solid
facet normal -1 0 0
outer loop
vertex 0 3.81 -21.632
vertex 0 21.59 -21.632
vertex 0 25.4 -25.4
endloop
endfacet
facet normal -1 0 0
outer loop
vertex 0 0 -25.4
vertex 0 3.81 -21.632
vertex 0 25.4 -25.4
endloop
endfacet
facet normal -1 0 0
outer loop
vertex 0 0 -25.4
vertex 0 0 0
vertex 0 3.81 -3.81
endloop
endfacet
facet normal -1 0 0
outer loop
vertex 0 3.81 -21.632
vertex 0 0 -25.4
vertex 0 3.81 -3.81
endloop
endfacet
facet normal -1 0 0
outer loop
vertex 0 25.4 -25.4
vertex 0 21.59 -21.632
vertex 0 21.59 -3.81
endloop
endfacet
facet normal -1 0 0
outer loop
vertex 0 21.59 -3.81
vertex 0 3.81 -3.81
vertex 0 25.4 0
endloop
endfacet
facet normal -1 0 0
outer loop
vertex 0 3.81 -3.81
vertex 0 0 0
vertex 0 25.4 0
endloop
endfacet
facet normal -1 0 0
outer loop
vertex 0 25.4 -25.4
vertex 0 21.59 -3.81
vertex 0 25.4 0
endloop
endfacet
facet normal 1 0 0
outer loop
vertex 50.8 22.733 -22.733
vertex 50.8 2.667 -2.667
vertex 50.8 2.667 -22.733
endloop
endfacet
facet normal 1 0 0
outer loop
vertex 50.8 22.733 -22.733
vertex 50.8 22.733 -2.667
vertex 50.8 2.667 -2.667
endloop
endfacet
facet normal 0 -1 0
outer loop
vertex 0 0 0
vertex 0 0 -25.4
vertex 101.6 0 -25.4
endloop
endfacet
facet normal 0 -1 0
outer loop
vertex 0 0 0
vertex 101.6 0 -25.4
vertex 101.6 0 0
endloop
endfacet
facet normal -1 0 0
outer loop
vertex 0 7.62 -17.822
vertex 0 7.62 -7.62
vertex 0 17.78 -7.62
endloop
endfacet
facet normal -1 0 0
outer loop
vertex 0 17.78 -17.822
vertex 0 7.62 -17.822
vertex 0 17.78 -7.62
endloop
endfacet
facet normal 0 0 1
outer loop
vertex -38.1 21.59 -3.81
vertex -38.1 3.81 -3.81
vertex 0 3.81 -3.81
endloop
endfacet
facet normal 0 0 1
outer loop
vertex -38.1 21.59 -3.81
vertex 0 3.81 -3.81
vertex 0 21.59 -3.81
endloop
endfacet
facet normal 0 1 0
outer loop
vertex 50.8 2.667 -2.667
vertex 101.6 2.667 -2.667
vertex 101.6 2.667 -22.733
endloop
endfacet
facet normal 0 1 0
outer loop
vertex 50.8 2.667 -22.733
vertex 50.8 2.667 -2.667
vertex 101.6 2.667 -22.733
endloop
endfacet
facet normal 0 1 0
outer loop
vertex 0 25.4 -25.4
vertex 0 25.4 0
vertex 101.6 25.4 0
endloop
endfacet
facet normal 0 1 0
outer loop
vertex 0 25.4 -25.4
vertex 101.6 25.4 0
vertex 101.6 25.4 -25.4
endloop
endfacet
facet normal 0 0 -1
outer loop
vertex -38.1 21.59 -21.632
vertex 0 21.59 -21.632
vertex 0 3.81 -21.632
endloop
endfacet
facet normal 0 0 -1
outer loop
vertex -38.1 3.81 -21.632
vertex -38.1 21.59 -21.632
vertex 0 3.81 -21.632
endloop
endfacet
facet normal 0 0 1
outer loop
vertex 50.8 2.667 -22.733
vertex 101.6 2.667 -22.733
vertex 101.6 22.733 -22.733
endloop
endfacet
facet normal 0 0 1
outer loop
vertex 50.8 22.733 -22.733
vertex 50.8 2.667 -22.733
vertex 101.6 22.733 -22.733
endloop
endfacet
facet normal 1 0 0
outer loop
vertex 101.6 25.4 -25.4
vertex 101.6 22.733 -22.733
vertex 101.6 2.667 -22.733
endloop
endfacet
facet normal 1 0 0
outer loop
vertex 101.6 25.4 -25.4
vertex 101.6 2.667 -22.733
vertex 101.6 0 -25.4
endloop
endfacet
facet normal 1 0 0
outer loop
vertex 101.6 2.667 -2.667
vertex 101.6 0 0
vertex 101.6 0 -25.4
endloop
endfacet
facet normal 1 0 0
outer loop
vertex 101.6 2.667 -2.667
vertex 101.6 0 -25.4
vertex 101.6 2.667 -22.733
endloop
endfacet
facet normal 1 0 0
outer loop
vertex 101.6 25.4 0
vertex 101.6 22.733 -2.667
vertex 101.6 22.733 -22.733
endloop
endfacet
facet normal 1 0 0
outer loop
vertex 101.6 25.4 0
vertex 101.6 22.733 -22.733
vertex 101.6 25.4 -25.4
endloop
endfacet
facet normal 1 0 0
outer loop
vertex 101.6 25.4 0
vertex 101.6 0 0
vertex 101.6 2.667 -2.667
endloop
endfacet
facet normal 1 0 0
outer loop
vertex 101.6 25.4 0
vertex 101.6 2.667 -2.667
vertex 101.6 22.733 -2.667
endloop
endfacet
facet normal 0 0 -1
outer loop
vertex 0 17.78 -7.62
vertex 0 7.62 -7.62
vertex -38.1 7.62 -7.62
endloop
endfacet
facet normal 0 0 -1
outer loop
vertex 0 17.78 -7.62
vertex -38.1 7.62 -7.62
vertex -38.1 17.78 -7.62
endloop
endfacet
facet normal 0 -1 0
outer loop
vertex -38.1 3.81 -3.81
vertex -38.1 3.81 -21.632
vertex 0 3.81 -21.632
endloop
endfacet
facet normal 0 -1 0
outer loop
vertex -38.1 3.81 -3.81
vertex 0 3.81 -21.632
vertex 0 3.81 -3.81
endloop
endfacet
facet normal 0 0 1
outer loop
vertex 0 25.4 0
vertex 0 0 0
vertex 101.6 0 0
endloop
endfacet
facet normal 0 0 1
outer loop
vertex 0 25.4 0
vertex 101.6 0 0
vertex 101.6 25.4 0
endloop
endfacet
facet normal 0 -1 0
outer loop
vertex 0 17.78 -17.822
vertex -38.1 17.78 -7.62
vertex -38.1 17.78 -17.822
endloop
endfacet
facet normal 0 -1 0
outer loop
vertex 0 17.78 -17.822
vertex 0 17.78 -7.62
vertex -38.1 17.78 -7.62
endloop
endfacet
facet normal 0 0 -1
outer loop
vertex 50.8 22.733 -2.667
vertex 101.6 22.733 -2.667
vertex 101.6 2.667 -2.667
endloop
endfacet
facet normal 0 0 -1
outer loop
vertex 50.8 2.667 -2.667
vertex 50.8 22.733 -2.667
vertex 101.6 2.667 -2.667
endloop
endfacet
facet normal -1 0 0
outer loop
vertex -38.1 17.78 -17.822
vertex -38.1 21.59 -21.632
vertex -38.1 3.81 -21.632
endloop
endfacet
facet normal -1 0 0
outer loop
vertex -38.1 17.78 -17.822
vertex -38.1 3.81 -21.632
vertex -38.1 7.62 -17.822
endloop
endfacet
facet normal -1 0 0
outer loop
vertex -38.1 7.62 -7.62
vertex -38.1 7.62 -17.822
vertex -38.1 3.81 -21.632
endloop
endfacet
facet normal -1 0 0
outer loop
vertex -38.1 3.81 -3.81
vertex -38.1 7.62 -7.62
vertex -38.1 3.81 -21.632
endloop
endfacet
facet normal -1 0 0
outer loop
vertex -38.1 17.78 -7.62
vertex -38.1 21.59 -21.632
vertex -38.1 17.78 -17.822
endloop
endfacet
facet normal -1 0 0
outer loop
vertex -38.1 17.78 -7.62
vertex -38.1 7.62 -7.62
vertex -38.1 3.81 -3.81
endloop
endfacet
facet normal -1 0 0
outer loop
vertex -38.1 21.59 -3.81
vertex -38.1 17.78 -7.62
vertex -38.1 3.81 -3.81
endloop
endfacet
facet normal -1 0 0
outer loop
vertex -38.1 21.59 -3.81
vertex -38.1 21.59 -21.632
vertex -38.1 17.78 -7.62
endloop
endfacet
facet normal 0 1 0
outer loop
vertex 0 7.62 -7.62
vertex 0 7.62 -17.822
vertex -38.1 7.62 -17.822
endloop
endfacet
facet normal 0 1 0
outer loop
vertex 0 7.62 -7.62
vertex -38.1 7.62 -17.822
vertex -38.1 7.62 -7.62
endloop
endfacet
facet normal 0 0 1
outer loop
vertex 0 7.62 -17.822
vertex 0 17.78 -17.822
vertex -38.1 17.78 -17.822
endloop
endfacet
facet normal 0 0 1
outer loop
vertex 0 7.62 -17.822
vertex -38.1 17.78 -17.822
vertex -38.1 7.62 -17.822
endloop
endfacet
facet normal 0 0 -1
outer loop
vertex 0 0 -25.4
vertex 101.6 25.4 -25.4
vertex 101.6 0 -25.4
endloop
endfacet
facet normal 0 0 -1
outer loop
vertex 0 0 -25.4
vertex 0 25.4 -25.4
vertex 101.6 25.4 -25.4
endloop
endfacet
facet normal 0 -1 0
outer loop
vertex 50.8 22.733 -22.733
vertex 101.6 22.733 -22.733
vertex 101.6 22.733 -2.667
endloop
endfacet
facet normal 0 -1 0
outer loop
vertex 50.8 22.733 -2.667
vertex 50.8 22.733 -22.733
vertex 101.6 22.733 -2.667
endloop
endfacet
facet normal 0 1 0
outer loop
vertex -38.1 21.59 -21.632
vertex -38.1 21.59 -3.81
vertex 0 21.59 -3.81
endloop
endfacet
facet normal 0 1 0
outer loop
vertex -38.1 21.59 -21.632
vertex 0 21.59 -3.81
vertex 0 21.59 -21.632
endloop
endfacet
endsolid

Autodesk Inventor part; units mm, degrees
ref_plane "YZ Plane" through (0, 0, 0) normal (1, 0, 0) x (0, 1, 0)
ref_plane "XZ Plane" through (0, 0, 0) normal (0, 1, 0) x (-1, 0, 0)
ref_plane "XY Plane" through (0, 0, 0) normal (0, 0, 1) x (1, 0, 0)
sketch "Sketch1" plane through (0, 0, 0) normal (1, 0, 0) x (0, 1, 0)
  line L0 (0, 0) -> (25.4, 0)
  line L1 (25.4, 0) -> (25.4, -25.4)
  line L2 (25.4, -25.4) -> (0, -25.4)
  line L3 (0, -25.4) -> (0, 0)
  line L4 (0, 0) -> (3.175, 0)
  line L5 (0, -3.175) -> (0, 0)
  line L6 (3.175, -3.175) -> (22.225, -3.175)
  line L7 (22.225, -3.175) -> (22.225, -22.225)
  line L8 (22.225, -22.225) -> (3.175, -22.225)
  line L9 (3.175, -22.225) -> (3.175, -3.175)
  dimension "d0" = 25.4
  dimension "d1" = 25.4
  dimension "d6" = 19.05
  dimension "d7" = 19.05
extrude "Extrusion1" add sketch "Sketch1" along normal blind 101.6 contours L0 L1 L2 L3 | L6 L7 L8 L9
sketch "Sketch2" plane through (101.6, 0, 0) normal (1, 0, 0) x (0, 0, -1)
  line L0 (22.733, 22.225) -> (22.733, 22.733)
  line L1 (22.733, 22.733) -> (22.225, 22.733)
  line L2 (2.667, 3.175) -> (2.667, 2.667)
  line L3 (2.667, 2.667) -> (3.175, 2.667)
  line L4 (2.667, 2.667) -> (22.733, 2.667)
  line L5 (22.733, 2.667) -> (22.733, 22.733)
  line L6 (22.733, 22.733) -> (2.667, 22.733)
  line L7 (2.667, 22.733) -> (2.667, 2.667)
  point P0 (0, 0)
extrude "Extrusion2" cut sketch "Sketch2" against normal blind 50.8
sketch "Sketch3" plane through (0, 0, 0) normal (-1, 0, 0) x (0, 0, 1)
  line L0 (-25.4, 0) -> (-21.6315, 0)
  line L1 (-21.6315, 3.81) -> (-17.78, 3.81)
  line L2 (-21.6315, 7.62) -> (-21.6315, 3.81)
  line L3 (-3.81, 21.59) -> (-7.62, 21.59)
  line L4 (-3.81, 17.78) -> (-3.81, 21.59)
  line L5 (-21.6315, 3.81) -> (-3.81, 3.81)
  line L6 (-3.81, 3.81) -> (-3.81, 21.59)
  line L7 (-3.81, 21.59) -> (-21.6315, 21.59)
  line L8 (-21.6315, 21.59) -> (-21.6315, 3.81)
  line L9 (-17.8215, 7.6198) -> (-7.62, 7.6198)
  line L10 (-7.62, 7.6198) -> (-7.62, 17.78)
  line L11 (-7.62, 17.78) -> (-17.8215, 17.78)
  line L12 (-17.8215, 17.78) -> (-17.8215, 7.6198)
  point P0 (0, 25.4)
extrude "Extrusion3" add sketch "Sketch3" along normal blind 38.1
properties part number "Right Side Piece"
